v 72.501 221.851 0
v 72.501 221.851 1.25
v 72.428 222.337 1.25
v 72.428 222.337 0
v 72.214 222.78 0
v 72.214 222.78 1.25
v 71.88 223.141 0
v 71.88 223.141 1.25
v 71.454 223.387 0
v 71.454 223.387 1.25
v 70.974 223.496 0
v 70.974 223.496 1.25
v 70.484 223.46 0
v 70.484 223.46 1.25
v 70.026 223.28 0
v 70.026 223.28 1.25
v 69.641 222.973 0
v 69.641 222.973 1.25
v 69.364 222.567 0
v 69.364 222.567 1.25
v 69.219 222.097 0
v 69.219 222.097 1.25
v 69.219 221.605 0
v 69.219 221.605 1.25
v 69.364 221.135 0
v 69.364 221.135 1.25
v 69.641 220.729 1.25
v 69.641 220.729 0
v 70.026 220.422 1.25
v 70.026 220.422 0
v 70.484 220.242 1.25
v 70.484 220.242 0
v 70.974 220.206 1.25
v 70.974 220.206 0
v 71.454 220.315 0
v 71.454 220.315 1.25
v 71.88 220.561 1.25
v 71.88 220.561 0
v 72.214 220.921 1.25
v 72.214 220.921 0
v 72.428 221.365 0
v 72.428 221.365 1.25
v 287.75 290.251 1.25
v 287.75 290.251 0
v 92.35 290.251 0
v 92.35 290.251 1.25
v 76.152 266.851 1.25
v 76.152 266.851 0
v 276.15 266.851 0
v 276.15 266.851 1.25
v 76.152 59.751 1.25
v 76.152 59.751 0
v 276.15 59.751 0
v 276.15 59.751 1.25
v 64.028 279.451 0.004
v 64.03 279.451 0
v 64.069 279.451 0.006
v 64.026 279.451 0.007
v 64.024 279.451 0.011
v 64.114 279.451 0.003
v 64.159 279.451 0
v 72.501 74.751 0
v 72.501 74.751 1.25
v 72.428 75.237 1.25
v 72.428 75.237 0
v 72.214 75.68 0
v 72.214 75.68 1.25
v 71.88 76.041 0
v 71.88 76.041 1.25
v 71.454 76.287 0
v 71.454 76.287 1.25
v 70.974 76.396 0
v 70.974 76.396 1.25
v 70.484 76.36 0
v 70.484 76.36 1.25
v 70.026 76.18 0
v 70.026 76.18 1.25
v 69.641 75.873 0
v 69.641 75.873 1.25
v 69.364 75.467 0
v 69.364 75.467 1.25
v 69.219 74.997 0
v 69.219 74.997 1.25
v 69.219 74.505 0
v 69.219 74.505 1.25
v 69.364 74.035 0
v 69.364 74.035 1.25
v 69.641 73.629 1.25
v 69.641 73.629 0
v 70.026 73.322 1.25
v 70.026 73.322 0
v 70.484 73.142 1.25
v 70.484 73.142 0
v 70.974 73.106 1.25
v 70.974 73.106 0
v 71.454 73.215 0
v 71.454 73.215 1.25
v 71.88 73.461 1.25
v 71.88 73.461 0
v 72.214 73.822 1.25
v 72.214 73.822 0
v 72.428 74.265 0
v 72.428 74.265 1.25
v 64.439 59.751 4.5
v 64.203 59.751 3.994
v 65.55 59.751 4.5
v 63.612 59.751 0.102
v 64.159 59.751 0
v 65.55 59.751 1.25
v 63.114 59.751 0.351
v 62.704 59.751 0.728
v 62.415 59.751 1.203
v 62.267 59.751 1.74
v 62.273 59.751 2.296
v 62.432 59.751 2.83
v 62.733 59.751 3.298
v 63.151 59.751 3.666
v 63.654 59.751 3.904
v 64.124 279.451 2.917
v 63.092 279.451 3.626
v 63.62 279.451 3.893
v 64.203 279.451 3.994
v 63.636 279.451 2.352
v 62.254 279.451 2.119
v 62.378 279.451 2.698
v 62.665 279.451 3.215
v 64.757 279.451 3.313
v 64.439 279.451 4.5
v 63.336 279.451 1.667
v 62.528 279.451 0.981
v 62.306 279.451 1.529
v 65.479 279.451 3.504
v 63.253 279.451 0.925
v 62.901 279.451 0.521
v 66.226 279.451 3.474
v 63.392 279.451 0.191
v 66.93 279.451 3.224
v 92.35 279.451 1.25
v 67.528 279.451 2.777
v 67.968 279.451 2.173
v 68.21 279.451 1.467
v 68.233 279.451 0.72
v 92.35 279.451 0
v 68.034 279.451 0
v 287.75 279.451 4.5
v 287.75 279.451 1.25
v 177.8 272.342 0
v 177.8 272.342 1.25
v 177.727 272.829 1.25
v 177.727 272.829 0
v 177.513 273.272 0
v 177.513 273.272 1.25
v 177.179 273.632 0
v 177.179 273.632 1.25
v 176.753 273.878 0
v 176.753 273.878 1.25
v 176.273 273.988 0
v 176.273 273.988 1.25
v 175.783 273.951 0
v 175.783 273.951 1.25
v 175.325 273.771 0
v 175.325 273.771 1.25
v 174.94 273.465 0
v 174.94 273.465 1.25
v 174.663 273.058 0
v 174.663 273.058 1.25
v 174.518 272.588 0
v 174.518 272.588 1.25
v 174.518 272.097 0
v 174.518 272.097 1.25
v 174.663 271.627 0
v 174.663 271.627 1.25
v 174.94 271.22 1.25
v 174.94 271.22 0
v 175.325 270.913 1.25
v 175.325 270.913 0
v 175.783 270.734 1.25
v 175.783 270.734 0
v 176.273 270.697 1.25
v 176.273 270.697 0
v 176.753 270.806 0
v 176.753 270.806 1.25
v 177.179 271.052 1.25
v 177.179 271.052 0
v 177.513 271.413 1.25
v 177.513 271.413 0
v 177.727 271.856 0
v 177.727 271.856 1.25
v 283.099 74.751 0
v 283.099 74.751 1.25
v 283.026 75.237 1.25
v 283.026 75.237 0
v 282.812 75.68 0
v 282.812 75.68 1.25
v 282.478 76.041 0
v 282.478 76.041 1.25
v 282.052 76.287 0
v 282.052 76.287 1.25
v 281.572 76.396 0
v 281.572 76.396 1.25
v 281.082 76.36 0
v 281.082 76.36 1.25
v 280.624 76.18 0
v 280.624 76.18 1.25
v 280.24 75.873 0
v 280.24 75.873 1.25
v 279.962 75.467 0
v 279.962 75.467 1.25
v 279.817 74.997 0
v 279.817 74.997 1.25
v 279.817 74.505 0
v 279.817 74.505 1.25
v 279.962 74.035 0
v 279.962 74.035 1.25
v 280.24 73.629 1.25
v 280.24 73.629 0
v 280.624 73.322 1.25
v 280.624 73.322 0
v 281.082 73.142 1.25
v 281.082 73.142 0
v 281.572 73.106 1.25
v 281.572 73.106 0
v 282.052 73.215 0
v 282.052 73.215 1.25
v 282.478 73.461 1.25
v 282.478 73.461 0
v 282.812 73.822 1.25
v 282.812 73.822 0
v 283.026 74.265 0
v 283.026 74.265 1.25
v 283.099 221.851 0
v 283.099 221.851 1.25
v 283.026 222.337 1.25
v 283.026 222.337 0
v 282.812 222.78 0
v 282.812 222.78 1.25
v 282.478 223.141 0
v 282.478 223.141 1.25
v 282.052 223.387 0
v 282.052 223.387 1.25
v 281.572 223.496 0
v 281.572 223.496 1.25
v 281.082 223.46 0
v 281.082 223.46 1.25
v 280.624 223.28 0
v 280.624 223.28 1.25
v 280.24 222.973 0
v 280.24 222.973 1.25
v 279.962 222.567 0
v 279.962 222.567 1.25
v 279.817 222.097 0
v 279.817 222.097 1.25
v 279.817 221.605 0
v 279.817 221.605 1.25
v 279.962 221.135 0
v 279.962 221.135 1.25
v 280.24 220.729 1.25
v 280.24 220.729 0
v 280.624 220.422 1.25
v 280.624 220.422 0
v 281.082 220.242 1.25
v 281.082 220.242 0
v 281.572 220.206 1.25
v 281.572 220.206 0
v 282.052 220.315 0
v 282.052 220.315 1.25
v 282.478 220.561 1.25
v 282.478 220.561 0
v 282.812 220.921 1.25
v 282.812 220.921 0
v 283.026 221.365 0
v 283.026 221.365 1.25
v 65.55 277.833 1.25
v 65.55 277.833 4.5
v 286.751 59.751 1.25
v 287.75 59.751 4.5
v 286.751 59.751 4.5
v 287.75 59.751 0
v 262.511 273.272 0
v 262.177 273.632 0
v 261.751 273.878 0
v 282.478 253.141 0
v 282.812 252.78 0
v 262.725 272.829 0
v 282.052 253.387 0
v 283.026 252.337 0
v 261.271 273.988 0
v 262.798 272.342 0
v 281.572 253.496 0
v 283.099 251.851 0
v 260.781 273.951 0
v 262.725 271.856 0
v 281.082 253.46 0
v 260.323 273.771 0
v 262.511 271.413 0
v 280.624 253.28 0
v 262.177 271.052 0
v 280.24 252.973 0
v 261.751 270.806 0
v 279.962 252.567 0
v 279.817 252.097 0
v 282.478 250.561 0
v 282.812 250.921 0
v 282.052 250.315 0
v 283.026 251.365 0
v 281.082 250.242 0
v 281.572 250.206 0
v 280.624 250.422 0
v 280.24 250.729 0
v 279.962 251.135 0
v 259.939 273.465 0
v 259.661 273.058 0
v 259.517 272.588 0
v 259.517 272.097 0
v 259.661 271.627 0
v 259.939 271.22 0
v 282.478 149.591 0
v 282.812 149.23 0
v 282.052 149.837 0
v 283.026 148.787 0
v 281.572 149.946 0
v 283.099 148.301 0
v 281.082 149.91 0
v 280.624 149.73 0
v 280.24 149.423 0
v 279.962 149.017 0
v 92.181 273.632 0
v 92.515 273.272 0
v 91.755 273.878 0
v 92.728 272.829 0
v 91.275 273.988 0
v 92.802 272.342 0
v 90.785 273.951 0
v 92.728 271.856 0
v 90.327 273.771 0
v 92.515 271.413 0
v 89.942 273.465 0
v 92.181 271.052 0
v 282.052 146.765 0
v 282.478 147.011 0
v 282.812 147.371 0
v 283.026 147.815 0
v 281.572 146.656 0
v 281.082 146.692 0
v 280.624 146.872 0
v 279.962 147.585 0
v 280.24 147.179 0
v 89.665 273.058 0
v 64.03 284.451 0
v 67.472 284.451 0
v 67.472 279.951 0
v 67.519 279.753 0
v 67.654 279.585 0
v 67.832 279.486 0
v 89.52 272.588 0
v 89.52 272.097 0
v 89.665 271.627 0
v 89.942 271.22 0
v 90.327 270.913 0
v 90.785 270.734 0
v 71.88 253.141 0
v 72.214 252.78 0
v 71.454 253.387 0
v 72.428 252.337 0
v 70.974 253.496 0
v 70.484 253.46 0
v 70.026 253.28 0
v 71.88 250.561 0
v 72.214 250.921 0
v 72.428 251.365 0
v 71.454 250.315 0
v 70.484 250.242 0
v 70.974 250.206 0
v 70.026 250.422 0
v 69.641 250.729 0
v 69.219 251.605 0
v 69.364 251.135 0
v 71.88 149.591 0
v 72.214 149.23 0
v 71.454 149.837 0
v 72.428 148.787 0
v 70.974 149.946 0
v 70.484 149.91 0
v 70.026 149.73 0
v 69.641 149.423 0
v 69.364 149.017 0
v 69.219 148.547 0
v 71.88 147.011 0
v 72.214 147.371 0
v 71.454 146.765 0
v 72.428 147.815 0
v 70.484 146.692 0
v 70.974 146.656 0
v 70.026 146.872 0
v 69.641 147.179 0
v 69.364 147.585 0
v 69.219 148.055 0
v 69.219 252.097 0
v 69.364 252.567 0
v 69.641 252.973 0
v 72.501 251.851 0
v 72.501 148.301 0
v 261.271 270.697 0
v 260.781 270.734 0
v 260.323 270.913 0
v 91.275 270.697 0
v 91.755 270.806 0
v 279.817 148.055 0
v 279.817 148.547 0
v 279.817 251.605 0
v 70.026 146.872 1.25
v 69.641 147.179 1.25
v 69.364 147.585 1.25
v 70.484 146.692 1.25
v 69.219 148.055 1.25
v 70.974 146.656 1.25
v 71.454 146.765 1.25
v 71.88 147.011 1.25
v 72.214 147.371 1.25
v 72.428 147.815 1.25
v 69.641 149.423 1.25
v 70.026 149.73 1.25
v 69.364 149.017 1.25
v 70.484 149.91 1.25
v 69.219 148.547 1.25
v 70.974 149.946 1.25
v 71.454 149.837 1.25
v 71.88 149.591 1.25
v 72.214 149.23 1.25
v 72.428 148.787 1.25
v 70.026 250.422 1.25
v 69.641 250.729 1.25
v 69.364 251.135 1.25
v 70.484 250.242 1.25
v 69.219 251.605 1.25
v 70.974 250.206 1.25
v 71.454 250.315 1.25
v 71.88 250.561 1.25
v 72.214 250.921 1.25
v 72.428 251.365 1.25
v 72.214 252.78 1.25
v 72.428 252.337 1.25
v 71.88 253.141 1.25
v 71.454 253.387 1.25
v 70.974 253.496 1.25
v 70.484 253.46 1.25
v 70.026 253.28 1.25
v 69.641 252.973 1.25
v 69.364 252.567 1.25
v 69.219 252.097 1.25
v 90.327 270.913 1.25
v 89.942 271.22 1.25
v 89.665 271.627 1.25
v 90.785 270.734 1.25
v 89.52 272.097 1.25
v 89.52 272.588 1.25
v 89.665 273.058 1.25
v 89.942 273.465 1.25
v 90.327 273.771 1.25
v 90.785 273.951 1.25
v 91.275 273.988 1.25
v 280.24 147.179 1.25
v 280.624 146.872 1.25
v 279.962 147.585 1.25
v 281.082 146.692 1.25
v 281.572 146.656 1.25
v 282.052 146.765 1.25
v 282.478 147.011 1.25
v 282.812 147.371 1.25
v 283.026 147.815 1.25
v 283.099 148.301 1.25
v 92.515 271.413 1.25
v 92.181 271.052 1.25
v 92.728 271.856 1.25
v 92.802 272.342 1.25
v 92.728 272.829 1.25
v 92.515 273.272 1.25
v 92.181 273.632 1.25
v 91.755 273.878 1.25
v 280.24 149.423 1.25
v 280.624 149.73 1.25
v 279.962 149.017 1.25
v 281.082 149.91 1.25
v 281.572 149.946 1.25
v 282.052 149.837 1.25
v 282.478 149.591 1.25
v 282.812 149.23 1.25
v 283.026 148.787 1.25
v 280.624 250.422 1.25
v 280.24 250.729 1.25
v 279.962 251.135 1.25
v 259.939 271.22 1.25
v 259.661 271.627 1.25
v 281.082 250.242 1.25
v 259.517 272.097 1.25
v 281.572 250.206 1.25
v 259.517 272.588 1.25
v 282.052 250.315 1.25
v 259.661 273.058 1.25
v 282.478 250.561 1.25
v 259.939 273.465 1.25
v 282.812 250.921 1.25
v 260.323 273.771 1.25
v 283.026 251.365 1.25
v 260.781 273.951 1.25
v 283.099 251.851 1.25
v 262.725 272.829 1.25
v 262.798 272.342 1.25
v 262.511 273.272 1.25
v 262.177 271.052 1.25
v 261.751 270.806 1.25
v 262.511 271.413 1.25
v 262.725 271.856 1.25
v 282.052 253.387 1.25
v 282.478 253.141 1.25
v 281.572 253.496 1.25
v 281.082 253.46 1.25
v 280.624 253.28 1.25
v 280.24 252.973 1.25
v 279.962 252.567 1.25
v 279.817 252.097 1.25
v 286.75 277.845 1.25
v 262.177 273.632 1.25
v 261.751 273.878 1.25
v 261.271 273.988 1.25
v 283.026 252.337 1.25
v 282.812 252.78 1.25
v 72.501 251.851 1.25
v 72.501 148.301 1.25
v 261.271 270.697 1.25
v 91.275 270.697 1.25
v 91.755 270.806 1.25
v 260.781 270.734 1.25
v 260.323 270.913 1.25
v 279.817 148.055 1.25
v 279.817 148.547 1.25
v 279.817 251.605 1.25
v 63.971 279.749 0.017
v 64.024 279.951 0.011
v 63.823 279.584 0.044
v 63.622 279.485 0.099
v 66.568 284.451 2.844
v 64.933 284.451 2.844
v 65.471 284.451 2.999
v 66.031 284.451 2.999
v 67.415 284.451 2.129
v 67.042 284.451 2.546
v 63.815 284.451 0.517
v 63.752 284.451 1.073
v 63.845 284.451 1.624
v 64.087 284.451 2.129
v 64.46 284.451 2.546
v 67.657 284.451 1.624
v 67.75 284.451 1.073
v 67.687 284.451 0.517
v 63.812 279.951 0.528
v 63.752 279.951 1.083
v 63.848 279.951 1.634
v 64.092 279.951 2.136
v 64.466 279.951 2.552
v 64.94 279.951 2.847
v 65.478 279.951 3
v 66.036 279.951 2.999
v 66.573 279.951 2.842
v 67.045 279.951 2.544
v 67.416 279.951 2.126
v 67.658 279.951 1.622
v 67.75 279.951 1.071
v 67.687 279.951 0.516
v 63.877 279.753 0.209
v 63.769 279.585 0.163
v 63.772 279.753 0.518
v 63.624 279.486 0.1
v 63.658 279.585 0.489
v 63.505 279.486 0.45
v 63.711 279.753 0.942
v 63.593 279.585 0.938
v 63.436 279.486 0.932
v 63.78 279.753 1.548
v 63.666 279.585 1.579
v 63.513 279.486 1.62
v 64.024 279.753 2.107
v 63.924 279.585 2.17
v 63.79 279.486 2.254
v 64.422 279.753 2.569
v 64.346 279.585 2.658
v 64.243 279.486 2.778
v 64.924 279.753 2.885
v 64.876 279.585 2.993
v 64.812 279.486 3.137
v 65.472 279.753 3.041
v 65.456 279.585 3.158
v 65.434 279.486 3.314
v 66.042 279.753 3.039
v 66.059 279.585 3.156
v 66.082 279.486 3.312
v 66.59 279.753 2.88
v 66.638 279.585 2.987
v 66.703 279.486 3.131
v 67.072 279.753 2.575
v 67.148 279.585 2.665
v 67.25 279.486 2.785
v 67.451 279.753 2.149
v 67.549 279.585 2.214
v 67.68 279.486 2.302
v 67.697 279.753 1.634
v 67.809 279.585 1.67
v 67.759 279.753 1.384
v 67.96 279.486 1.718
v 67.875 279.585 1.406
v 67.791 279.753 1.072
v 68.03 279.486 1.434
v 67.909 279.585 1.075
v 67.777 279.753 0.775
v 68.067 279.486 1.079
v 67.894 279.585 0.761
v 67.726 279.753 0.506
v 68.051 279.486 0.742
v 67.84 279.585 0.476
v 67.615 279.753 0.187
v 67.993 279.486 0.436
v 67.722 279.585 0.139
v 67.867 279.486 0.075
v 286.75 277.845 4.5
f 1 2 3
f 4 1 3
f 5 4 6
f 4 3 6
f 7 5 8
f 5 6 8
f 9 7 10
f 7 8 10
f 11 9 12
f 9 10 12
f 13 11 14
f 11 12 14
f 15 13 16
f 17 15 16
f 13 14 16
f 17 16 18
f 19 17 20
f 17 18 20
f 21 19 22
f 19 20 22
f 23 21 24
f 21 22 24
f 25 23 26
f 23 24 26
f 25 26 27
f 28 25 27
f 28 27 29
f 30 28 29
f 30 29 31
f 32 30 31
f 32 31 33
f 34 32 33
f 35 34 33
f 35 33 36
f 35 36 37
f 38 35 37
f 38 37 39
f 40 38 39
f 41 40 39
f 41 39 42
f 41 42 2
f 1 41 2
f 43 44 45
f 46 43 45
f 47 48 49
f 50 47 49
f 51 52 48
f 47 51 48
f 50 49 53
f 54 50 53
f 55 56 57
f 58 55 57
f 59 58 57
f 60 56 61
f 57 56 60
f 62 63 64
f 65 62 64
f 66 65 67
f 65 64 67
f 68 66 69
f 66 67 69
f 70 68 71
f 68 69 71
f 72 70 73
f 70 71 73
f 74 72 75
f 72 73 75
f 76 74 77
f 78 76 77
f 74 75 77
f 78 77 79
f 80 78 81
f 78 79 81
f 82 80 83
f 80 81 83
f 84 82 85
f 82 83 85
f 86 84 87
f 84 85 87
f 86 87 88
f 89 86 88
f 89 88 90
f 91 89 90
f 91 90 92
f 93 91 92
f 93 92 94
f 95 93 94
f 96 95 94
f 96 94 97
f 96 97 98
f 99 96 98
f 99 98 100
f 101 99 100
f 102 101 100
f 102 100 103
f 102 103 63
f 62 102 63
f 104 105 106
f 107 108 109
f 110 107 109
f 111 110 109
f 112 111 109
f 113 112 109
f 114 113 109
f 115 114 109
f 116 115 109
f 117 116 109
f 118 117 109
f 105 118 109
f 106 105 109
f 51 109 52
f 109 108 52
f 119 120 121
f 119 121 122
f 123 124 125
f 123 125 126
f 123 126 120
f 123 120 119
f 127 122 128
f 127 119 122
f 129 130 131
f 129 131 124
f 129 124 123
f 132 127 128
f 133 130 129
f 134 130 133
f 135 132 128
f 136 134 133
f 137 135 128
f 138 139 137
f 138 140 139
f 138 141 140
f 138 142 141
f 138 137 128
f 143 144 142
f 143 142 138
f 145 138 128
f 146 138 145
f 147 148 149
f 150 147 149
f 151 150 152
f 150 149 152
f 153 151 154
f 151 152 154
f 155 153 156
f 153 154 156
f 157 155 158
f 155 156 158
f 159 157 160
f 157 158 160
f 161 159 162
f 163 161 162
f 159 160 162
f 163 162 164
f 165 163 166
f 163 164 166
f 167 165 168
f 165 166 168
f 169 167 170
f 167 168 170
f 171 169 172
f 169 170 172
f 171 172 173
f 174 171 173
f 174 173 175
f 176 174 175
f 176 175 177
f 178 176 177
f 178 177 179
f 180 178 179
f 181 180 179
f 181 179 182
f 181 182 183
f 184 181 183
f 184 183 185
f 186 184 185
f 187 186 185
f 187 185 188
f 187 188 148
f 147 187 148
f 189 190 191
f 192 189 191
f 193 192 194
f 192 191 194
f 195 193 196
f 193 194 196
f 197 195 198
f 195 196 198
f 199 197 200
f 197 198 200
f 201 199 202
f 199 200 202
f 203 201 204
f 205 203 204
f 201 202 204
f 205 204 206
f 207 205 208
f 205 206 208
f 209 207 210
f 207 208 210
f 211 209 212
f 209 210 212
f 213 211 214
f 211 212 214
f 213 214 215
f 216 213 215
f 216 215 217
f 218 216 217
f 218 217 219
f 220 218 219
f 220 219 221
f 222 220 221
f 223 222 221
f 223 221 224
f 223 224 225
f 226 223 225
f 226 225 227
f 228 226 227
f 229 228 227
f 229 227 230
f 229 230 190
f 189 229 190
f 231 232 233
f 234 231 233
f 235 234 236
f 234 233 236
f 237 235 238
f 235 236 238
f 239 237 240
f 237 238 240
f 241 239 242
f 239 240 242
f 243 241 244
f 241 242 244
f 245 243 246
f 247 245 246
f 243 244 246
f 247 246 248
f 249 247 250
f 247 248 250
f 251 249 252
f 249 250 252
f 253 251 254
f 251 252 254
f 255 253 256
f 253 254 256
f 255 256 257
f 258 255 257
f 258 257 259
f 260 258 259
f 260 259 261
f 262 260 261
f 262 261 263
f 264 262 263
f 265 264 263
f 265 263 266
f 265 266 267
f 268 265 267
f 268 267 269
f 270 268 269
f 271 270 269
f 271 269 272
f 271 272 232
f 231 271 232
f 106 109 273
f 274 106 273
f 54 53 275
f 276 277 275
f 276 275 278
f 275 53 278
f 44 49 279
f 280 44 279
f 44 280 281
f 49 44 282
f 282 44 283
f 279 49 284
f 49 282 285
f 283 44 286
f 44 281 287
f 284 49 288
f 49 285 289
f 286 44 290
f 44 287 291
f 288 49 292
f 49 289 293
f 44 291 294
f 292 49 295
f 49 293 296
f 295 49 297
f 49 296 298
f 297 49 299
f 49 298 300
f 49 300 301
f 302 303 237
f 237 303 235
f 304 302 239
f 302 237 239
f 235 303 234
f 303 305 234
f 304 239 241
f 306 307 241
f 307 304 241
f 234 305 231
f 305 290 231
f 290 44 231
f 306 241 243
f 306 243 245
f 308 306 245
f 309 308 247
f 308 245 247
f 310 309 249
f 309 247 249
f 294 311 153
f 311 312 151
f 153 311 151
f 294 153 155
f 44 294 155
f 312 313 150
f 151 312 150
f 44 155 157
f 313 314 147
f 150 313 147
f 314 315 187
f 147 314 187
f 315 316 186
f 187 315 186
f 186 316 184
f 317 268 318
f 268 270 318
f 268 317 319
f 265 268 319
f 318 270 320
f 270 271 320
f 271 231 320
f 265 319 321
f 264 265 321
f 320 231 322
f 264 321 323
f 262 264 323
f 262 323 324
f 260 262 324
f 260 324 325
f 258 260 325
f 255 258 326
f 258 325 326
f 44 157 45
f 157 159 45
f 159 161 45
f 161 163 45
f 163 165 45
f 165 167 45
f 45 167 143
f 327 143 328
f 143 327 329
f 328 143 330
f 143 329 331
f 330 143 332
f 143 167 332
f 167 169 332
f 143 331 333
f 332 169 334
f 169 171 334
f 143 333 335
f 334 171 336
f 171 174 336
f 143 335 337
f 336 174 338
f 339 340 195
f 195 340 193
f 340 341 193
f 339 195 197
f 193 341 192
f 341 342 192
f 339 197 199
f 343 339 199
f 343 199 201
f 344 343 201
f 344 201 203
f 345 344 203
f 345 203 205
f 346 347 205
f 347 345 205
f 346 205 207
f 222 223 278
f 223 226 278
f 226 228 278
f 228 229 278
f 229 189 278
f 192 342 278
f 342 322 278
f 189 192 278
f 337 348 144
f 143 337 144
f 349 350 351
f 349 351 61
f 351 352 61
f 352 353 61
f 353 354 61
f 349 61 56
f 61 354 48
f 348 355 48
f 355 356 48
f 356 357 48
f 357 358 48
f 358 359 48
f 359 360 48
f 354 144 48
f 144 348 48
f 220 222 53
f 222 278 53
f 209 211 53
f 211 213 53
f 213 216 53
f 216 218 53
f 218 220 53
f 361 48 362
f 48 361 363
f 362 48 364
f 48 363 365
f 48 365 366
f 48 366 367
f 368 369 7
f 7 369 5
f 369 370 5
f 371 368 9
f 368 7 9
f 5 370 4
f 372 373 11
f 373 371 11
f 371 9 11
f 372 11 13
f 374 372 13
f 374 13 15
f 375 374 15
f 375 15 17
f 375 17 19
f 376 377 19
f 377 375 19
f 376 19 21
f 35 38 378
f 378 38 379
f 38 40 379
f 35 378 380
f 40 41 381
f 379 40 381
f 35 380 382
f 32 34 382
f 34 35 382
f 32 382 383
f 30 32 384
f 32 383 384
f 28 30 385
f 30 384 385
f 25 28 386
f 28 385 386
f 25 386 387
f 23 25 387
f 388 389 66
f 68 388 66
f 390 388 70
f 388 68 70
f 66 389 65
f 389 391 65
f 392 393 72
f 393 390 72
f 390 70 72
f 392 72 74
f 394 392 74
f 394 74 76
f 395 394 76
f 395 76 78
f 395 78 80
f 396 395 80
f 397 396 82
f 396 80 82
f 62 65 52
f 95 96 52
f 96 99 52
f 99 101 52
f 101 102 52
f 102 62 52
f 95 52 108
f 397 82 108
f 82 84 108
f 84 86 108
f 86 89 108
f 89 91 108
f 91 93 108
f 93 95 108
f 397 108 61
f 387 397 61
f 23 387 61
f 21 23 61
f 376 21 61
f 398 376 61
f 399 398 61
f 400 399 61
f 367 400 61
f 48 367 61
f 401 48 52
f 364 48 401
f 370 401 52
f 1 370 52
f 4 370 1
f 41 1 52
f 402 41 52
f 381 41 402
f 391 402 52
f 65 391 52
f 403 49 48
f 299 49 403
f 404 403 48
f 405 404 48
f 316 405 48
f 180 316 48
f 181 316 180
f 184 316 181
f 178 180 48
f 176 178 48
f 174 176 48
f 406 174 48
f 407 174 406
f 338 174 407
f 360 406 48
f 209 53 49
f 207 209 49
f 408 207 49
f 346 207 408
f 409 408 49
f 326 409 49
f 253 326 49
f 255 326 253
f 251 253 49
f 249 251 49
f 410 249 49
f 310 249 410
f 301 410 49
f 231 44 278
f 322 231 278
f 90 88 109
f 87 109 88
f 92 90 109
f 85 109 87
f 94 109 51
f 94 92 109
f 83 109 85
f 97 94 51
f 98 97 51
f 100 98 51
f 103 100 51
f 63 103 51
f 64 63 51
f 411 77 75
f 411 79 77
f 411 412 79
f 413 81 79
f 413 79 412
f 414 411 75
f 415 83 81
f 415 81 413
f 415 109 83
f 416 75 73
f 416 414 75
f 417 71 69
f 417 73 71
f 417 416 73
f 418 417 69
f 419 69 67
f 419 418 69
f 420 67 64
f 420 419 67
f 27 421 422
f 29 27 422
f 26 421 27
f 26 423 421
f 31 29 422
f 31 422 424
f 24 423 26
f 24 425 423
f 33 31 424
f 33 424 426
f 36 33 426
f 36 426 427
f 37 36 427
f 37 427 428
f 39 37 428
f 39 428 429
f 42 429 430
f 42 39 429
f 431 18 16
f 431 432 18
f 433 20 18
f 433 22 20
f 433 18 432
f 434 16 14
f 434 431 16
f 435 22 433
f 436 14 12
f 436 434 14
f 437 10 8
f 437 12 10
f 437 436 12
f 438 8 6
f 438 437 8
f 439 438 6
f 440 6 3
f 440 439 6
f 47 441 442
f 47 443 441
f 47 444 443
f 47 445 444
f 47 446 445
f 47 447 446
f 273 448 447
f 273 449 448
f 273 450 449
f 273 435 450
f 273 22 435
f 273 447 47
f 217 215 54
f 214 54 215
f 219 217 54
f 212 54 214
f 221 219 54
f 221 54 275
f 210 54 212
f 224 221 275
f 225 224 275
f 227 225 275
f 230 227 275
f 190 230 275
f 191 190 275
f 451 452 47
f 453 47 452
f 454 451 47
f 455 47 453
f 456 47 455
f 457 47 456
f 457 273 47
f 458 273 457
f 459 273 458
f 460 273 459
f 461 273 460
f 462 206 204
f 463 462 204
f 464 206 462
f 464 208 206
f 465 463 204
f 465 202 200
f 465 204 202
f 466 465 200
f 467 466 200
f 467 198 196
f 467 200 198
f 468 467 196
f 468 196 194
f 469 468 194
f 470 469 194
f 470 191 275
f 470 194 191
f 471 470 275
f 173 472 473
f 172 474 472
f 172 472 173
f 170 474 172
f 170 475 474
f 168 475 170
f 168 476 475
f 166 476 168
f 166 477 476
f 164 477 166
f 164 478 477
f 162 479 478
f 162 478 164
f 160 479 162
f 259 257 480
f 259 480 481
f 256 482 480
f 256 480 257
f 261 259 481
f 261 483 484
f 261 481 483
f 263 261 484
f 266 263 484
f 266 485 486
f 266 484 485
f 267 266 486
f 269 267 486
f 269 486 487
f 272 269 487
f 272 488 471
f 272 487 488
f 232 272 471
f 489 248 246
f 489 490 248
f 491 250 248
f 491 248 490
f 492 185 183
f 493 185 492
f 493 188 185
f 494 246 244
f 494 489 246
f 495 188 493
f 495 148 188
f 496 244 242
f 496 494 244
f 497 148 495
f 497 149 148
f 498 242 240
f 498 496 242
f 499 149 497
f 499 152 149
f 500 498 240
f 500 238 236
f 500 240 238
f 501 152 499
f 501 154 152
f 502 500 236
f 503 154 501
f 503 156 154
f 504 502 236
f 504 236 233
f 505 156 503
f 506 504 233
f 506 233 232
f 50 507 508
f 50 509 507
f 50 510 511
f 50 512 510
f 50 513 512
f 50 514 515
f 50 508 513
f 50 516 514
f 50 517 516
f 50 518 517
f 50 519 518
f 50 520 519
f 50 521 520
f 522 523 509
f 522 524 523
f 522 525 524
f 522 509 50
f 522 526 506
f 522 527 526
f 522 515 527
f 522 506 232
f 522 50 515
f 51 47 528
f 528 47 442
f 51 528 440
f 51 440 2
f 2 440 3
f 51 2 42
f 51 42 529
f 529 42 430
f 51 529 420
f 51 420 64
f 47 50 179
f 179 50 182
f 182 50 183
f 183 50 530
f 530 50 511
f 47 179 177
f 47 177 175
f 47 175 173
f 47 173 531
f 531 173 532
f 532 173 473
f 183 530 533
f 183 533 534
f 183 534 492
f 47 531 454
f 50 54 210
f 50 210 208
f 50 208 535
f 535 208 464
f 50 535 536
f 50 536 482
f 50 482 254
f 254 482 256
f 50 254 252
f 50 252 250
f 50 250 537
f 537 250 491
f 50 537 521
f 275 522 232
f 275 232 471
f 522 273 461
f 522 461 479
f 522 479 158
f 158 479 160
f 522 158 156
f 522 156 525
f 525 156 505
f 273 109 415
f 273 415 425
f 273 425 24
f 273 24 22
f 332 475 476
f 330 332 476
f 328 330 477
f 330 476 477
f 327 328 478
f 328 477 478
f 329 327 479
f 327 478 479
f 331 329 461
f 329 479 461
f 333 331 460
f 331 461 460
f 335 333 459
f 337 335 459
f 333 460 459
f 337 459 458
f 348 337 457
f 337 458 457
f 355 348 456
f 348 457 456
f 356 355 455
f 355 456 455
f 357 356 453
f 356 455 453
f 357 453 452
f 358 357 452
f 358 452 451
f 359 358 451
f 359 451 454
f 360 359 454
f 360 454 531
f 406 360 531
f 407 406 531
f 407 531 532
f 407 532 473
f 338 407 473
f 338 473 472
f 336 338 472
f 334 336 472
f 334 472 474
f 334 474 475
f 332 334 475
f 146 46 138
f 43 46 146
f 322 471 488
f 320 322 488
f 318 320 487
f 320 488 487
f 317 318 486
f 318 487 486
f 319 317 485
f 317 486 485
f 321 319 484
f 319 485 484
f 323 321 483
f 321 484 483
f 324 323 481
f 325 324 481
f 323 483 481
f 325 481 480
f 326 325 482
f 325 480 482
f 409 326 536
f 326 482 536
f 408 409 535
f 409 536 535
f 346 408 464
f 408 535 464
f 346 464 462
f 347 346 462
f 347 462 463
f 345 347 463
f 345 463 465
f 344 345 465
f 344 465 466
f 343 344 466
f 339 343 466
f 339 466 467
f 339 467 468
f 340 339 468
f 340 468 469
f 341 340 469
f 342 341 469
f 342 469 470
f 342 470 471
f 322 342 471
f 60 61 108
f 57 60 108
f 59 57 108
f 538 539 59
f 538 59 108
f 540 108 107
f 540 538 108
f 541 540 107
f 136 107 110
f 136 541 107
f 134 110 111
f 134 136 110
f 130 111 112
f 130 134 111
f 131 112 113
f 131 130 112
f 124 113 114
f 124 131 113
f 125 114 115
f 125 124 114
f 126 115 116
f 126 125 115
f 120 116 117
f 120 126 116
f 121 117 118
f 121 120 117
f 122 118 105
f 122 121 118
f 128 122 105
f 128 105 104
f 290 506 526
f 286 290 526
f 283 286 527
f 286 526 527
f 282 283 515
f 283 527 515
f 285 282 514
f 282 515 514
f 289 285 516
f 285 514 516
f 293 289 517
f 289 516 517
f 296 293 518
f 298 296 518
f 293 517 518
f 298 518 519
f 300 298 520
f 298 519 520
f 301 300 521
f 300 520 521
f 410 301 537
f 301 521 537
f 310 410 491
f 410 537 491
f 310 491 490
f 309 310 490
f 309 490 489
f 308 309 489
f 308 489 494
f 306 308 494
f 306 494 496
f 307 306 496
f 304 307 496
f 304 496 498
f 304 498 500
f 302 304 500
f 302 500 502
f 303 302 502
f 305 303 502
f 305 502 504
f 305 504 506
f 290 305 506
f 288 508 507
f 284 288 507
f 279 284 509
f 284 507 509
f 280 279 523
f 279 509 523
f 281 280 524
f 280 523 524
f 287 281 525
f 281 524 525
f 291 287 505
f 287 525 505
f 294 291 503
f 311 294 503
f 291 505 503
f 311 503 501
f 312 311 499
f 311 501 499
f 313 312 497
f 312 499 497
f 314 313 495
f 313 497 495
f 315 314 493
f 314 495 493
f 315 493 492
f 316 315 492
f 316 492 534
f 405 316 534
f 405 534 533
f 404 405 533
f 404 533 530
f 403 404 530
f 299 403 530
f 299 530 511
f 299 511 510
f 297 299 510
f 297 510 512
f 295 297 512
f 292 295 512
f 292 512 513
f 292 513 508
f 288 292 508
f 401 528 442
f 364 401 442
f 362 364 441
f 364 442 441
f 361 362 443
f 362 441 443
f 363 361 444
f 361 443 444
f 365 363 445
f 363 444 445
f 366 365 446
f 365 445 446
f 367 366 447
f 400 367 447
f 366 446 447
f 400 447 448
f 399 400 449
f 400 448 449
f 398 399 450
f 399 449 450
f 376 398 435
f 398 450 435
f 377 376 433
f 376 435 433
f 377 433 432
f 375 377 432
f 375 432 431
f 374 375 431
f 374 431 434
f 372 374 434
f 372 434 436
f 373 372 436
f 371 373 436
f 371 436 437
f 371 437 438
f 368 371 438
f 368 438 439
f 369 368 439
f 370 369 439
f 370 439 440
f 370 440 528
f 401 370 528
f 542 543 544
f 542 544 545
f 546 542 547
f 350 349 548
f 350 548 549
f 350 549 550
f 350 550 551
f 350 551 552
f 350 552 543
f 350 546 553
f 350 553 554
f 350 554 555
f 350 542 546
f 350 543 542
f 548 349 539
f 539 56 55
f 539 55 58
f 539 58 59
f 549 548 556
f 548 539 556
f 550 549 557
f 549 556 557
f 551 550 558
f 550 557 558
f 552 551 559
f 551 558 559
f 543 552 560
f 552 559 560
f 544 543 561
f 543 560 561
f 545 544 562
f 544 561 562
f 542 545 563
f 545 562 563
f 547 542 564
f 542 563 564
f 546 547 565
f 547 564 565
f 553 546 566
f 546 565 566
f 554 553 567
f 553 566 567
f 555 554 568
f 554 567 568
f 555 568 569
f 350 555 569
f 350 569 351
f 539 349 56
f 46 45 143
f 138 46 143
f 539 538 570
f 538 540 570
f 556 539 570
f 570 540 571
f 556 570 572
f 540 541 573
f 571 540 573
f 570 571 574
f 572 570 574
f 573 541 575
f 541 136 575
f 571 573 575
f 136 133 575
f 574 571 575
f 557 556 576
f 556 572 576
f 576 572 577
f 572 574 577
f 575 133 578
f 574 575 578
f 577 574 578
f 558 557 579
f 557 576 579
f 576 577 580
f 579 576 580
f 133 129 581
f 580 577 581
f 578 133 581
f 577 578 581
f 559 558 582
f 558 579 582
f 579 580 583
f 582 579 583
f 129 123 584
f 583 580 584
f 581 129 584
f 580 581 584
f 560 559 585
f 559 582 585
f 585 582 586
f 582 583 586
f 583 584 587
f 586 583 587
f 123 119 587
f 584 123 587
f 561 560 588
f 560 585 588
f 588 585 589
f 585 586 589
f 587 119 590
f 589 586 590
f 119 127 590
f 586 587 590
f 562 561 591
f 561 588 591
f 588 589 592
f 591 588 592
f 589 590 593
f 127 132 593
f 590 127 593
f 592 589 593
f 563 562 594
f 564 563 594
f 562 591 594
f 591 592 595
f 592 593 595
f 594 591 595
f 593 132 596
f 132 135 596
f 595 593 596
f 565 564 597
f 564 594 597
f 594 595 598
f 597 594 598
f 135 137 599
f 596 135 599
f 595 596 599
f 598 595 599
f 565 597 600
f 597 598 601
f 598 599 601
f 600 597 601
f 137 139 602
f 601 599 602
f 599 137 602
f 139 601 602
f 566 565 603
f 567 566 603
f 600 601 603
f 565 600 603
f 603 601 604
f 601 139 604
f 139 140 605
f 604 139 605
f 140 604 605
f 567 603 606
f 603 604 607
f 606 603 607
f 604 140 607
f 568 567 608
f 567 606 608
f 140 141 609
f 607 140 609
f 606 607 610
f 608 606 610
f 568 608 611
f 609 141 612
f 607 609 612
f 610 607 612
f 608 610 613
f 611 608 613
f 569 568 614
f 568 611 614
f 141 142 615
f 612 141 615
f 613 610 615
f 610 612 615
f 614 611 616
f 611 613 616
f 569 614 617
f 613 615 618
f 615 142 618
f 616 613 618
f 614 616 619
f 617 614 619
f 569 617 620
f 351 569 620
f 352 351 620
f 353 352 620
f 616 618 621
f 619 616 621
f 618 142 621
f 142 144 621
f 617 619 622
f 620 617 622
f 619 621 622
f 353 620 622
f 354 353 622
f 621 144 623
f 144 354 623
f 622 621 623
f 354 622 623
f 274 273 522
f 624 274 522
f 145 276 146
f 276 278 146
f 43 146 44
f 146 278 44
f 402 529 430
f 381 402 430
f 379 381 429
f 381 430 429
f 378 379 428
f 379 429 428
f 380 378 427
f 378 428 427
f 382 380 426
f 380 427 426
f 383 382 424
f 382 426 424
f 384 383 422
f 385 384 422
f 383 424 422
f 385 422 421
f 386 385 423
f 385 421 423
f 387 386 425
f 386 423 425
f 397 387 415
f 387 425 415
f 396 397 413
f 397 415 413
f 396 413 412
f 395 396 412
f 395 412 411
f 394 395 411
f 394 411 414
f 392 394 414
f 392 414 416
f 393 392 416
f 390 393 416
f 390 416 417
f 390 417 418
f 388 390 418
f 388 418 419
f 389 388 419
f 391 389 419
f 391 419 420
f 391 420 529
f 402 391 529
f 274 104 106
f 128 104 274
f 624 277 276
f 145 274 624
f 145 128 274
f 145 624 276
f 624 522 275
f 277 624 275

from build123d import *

# Parameters (mm, degrees)
SALIENTE_EXTRUIR1_DEPTH = 1.25
SALIENTE_EXTRUIR2_DEPTH = 3.25
SALIENTE_EXTRUIR3_DEPTH = 219.699982554
SALIENTE_EXTRUIR4_DEPTH = 5
REDONDEO1_R             = 0.5
CROQUIS7_R              = 1.65
CORTAR_EXTRUIR1_DEPTH   = 409.725190141


with BuildPart() as part:
    # Croquis1 → Saliente-Extruir1 (new body)
    with BuildSketch(Plane.XY):
        Polygon((76.151803136, 59.751000255), (76.151803136, 266.850888729), (276.149988174, 266.850888729), (276.149988174, 59.751000255), (287.750005722, 59.751000255), (287.750005722, 290.251016617), (92.349797487, 290.251016617), (92.349797487, 279.450982809), (64.949996769, 279.450982809), (64.439042354, 59.751000255), align=None)
    extrude(amount=SALIENTE_EXTRUIR1_DEPTH)

    # Croquis3 → Saliente-Extruir2 (add)
    with BuildSketch(Plane.XY.offset(1.25)):
        Polygon((65.549881, 59.751000255), (65.549881, 277.83340256), (286.749988794, 277.845112205), (286.751151675, 59.751000255), (287.750005722, 59.751000255), (287.750005722, 279.450982809), (92.349797487, 279.450982809), (64.949996769, 279.450982809), (64.439042354, 59.751000255), align=None)
    extrude(amount=SALIENTE_EXTRUIR2_DEPTH)

    # Croquis4 → Saliente-Extruir3 (add)
    with BuildSketch(Plane(origin=(0, 279.450982809, 0), x_dir=(1, 0, 0), z_dir=(0, 1, 0))):
        with BuildLine():
            Line((64.20314146, -3.994108901), (64.439042354, -4.5))
            Line((64.439042354, -4.5), (64.949996769, -4.5))
            Line((64.949996769, -4.5), (64.949996769, 0))
            Line((64.949996769, 0), (64.159257759, 0))
            ThreePointArc((64.159257759, 0), (62.250455442, -2.018267743), (64.20314146, -3.994108901))
        make_face()
    extrude(amount=-SALIENTE_EXTRUIR3_DEPTH)

    # Croquis6 → Saliente-Extruir4 (add)
    with BuildSketch(Plane(origin=(0, 279.450982809, 0), x_dir=(1, 0, 0), z_dir=(0, 1, 0))):
        with BuildLine():
            Line((67.471777384, 0), (64.029912079, 0))
            ThreePointArc((64.029912079, 0), (65.750844731, -3.019014625), (67.471777384, 0))
        make_face()
    extrude(amount=SALIENTE_EXTRUIR4_DEPTH)

    # Redondeo1
    redondeo1_edges = [part.edges().sort_by_distance(p)[0] for p in [
        (65.757057169, 279.450982809, 3.019004976),
    ]]
    fillet(redondeo1_edges, radius=REDONDEO1_R)

    # Croquis7 → Cortar-Extruir1 (cut, through all)
    with BuildSketch(Plane.XY.offset(1.25)):
        with Locations((70.850842068, 74.751000255)):
            Circle(CROQUIS7_R)
        with Locations((70.850842068, 251.850888729)):
            Circle(CROQUIS7_R)
        with Locations((70.850842068, 221.850888729)):
            Circle(CROQUIS7_R)
        with Locations((70.850842068, 148.300944492)):
            Circle(CROQUIS7_R)
        with Locations((91.151803136, 272.342426261)):
            Circle(CROQUIS7_R)
        with Locations((176.149949567, 272.342426261)):
            Circle(CROQUIS7_R)
        with Locations((261.148095998, 272.342426261)):
            Circle(CROQUIS7_R)
        with Locations((281.449057067, 251.850888729)):
            Circle(CROQUIS7_R)
        with Locations((281.449057067, 221.850888729)):
            Circle(CROQUIS7_R)
        with Locations((281.449057067, 148.300944492)):
            Circle(CROQUIS7_R)
        with Locations((281.449057067, 74.751000255)):
            Circle(CROQUIS7_R)
    extrude(amount=-CORTAR_EXTRUIR1_DEPTH, mode=Mode.SUBTRACT)


solid = part.part
